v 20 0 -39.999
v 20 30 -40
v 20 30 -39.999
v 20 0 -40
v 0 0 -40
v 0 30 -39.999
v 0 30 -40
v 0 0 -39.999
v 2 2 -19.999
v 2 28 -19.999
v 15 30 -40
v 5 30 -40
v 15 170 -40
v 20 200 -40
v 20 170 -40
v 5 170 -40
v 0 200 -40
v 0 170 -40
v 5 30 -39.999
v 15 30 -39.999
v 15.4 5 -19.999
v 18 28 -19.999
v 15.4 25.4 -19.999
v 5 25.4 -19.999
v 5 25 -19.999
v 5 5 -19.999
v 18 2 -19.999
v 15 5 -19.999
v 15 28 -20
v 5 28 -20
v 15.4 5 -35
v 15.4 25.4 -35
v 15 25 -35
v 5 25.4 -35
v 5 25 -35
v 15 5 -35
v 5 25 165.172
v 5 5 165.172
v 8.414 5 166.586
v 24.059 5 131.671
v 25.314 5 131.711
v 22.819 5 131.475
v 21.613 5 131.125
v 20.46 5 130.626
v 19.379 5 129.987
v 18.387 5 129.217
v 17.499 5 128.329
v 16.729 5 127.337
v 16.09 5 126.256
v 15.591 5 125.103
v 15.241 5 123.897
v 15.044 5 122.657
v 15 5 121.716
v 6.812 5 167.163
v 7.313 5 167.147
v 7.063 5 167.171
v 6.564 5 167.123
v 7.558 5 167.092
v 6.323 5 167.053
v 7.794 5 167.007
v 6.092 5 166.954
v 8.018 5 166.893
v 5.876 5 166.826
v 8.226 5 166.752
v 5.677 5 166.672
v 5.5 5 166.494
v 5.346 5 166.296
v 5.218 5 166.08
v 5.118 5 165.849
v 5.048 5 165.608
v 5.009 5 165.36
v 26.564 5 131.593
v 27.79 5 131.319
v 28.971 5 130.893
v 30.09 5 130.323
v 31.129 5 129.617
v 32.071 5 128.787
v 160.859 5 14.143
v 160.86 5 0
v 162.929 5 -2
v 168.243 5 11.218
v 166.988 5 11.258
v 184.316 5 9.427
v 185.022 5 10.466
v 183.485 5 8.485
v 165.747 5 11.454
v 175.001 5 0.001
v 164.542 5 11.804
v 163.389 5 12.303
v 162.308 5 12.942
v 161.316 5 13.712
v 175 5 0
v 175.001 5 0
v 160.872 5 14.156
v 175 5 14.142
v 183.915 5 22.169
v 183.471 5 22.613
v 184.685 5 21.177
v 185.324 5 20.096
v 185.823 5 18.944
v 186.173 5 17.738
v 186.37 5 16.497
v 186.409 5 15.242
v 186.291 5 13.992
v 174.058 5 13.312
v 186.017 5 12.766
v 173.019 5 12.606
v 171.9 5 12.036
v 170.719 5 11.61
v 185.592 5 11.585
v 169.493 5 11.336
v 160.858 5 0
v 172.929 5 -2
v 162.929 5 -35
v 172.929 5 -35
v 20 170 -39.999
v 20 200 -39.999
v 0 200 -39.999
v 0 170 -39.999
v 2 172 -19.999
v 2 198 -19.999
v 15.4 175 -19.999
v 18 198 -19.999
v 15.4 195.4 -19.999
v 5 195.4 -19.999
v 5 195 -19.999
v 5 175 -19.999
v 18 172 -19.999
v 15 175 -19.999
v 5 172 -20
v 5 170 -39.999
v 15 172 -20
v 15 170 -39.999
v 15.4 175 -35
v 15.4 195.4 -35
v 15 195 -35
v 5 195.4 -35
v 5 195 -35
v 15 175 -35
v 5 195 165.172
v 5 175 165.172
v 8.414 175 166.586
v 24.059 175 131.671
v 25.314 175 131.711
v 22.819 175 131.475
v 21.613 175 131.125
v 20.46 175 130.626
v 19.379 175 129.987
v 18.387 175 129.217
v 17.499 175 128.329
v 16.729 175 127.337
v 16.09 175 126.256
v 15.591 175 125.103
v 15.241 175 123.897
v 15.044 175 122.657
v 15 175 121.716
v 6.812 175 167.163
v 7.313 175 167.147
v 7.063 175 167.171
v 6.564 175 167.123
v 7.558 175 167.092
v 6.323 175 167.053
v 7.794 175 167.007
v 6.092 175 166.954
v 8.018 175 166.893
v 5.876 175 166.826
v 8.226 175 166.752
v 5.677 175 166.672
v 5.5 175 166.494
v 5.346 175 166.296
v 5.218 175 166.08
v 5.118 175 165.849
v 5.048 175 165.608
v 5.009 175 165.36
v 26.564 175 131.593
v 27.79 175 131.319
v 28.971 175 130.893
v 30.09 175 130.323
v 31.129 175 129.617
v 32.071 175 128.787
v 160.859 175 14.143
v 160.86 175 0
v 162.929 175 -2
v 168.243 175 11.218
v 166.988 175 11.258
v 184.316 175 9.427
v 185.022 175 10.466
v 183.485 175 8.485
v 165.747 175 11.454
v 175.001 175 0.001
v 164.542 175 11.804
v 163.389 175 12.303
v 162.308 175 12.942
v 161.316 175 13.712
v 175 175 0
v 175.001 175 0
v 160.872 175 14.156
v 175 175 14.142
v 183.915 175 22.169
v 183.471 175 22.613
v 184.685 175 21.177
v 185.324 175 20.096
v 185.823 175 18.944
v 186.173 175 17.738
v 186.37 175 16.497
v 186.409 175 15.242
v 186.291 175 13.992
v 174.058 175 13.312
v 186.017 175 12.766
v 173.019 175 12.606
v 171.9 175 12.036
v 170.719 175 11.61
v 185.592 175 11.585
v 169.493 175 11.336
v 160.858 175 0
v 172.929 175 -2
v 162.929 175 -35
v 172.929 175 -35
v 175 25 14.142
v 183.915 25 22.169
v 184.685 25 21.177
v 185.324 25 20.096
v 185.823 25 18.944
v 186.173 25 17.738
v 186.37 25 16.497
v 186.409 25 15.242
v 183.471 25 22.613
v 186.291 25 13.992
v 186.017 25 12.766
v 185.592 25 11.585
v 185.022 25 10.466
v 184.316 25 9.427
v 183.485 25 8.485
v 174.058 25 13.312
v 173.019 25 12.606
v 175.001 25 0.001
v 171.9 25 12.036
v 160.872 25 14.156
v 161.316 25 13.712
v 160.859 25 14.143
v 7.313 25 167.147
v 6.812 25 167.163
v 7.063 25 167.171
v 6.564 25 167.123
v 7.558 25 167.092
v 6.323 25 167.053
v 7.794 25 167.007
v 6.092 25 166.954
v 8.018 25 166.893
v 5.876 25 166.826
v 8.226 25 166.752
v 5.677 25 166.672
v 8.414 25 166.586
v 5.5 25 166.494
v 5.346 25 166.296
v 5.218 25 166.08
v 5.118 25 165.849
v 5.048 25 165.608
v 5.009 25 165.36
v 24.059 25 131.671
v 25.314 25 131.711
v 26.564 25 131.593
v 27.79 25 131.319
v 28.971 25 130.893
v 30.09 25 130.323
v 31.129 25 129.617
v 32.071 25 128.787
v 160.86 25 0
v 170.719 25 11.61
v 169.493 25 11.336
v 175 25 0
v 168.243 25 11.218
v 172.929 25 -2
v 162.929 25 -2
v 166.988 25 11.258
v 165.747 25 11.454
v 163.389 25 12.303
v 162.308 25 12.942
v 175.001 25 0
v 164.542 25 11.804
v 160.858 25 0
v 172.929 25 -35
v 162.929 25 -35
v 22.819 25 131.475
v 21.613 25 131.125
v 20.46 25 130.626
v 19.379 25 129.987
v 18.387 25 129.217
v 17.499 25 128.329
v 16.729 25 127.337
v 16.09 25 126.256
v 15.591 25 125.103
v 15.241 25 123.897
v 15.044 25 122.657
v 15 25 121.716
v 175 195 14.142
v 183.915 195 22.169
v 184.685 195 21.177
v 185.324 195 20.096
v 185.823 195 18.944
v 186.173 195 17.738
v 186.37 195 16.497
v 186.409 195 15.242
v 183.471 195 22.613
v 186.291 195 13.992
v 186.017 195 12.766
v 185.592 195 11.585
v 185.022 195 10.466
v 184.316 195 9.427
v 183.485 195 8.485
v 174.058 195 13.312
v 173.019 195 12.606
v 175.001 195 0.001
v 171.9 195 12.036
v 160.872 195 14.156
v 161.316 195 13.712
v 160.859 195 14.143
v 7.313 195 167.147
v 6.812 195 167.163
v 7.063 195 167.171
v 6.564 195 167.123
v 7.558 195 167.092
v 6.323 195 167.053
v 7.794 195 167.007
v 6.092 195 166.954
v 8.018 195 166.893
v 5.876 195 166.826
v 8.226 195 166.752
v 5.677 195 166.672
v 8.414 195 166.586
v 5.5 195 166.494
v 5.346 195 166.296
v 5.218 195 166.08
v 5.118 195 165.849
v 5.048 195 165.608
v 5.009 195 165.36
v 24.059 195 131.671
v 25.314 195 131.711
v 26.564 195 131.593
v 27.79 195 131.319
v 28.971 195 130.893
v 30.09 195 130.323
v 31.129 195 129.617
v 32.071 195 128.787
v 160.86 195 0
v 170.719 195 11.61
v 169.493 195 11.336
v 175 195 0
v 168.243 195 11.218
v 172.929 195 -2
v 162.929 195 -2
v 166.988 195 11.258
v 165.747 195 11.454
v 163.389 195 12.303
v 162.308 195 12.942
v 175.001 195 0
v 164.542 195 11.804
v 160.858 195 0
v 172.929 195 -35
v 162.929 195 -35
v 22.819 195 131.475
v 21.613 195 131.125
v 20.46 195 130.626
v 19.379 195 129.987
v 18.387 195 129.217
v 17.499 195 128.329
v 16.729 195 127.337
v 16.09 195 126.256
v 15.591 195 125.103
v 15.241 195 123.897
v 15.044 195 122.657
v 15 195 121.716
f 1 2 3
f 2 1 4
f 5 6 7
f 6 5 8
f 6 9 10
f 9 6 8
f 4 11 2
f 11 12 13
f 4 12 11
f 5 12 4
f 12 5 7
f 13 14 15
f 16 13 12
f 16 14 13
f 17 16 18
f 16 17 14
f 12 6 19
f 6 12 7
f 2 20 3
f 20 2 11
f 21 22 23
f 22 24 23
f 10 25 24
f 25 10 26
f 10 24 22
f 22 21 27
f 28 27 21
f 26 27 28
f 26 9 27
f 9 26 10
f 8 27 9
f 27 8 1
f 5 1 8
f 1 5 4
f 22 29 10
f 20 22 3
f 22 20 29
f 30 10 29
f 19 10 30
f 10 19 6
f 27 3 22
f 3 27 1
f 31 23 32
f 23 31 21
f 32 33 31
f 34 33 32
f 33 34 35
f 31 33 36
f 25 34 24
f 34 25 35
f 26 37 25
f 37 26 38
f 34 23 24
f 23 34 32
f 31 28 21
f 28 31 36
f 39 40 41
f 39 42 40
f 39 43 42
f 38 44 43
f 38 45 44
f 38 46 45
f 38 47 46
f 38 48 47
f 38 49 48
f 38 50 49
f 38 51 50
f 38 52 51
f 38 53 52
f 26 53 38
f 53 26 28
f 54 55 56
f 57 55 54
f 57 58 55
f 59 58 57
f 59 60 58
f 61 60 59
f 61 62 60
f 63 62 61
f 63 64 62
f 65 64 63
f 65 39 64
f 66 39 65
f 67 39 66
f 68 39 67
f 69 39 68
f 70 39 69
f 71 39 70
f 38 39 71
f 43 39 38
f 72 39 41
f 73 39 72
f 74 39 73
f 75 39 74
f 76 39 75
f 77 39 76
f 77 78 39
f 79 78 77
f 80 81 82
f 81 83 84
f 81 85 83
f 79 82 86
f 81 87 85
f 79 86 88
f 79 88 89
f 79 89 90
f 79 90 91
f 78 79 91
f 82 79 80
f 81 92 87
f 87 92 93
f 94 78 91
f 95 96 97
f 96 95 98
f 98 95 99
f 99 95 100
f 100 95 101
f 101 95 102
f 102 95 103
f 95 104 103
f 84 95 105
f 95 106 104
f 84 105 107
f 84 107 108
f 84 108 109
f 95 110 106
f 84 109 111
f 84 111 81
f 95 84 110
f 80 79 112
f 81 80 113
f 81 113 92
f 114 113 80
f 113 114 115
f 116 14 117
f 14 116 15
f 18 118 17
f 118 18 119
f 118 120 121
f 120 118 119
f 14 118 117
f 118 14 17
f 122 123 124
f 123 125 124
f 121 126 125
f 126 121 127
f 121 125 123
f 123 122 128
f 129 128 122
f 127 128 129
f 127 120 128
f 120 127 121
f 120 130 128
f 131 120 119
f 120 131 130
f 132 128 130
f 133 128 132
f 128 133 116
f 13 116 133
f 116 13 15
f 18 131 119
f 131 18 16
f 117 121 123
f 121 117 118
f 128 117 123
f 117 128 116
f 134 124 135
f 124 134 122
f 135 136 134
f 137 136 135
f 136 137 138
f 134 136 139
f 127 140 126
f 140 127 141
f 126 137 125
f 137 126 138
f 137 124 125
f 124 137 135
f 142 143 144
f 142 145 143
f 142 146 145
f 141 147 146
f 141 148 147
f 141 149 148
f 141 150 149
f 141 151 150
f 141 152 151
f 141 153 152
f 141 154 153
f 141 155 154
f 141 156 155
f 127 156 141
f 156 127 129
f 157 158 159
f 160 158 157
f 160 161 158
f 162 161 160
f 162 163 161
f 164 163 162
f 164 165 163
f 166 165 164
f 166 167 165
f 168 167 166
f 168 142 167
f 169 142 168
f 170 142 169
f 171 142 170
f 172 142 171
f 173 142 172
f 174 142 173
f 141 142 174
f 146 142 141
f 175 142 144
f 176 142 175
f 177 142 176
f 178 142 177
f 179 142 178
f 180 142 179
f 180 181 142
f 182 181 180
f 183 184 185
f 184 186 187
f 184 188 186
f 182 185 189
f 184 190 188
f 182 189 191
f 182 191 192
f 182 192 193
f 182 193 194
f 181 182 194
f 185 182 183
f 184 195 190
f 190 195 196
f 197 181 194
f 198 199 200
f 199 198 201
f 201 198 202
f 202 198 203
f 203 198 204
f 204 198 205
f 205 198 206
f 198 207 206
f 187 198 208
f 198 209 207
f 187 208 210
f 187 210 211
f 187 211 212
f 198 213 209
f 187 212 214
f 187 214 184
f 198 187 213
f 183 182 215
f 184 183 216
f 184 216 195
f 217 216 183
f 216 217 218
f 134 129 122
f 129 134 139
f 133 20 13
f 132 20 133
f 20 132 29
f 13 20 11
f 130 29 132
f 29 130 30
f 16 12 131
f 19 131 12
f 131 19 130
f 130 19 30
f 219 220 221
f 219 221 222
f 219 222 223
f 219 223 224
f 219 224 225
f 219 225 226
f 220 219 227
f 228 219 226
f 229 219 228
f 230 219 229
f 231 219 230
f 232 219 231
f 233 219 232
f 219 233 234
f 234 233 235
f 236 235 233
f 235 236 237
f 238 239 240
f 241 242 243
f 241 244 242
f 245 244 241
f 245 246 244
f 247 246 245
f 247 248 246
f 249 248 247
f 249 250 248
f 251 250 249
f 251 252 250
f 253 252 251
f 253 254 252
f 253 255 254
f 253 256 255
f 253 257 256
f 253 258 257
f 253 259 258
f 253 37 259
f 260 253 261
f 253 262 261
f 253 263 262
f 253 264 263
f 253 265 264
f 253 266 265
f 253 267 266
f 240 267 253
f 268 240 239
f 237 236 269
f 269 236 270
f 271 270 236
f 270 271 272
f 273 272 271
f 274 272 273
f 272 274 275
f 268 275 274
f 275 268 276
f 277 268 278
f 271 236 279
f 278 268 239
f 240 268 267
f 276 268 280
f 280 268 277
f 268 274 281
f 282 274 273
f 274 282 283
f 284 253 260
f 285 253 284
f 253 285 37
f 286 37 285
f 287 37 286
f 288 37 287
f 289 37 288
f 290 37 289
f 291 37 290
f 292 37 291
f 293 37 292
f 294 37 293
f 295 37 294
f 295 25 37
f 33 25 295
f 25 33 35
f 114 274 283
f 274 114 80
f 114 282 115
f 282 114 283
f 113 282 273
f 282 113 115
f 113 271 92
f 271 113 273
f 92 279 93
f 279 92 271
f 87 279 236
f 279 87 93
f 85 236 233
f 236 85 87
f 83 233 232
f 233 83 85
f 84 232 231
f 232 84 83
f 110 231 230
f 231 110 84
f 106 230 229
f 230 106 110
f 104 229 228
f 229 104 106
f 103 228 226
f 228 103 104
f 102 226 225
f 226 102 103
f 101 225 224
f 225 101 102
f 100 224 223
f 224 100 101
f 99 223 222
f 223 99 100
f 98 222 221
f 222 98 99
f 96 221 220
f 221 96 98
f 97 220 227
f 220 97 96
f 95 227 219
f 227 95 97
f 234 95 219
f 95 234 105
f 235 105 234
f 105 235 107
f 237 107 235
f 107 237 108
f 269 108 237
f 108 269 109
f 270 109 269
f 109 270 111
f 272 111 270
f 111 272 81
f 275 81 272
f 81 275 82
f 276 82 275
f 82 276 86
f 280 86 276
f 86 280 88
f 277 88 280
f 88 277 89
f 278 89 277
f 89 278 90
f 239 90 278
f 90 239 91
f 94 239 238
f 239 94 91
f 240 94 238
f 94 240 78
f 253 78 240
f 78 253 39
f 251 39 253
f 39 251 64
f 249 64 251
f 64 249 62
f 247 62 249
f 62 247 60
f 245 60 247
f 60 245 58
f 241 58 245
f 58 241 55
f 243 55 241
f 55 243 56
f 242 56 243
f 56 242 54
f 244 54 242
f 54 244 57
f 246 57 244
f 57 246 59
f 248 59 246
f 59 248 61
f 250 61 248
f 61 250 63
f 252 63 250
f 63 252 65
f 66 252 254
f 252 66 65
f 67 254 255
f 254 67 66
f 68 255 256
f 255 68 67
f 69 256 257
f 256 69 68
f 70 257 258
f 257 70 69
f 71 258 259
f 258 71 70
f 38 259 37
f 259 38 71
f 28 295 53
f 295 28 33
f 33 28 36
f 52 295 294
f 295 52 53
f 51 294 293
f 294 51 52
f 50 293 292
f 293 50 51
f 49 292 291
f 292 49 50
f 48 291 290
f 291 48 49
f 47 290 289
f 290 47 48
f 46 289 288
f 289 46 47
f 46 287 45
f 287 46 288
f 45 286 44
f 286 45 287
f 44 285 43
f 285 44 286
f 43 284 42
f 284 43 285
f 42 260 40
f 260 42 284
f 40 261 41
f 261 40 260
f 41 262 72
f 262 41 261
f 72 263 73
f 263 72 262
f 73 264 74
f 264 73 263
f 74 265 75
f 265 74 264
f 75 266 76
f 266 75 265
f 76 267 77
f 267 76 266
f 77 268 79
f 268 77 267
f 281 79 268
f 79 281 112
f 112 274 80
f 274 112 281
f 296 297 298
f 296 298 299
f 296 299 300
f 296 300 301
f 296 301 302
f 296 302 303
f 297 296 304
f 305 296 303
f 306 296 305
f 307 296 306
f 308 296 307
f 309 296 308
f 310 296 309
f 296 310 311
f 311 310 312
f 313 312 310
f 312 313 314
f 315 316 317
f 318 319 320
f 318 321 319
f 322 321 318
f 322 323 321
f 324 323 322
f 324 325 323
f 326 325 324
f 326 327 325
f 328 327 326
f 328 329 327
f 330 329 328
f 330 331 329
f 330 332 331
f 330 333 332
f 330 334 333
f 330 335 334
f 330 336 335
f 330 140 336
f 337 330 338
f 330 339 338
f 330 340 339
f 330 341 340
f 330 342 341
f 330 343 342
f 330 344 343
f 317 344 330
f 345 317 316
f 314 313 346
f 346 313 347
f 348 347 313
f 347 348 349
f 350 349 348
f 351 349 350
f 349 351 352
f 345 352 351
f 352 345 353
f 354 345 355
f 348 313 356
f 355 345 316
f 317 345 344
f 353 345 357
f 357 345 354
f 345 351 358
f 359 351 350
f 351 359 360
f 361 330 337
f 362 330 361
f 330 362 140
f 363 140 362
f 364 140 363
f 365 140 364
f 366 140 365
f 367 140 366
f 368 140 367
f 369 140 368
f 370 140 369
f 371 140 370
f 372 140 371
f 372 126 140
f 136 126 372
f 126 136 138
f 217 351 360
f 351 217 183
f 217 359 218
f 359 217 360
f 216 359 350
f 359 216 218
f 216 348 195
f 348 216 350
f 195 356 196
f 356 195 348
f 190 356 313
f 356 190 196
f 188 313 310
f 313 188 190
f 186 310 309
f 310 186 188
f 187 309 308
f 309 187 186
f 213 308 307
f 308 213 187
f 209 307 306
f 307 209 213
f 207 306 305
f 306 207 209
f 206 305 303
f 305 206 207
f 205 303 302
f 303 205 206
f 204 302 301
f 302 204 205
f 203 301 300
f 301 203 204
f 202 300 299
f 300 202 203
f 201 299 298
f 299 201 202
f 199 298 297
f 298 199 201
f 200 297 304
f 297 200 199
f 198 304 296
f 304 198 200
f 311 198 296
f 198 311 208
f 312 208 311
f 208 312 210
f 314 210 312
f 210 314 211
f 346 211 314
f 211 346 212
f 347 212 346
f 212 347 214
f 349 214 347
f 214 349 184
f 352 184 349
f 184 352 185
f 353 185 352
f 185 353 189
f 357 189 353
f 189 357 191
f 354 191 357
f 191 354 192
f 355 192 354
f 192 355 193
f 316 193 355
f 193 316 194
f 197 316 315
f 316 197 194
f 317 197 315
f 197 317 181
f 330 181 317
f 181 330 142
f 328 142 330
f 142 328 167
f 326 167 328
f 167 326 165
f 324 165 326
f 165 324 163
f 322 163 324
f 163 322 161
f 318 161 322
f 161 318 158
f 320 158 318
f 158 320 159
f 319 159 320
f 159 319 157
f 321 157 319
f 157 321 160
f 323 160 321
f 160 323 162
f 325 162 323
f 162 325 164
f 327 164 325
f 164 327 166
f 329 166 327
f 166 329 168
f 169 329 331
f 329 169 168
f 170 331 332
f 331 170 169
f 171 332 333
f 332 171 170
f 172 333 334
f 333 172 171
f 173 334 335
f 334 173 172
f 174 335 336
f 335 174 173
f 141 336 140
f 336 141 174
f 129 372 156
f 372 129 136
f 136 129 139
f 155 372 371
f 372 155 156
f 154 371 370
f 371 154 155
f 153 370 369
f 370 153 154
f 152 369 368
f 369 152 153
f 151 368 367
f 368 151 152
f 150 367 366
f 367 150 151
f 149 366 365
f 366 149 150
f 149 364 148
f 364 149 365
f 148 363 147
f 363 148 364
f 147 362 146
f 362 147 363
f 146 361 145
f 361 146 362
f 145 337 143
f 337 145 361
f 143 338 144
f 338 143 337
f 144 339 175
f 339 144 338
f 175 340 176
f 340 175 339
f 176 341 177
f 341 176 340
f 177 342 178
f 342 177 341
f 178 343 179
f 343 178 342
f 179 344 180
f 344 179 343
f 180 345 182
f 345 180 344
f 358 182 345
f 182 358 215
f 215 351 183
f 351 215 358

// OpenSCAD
// A customizable laptop stand 


// Module naming convenitions:
//  - xxx_shape is a 2D shape 
//  - xxx_part is a 3D part
//  - the stand is made of one `lower_rail_part` and two `upper_rail_part`s
//  - the upper rail's front section, that stops the laptop from falling is called the `tip`
//  - the lower rail's section for inserting the upper rail is called `shoe`  


//Input parameters:

ANGLE=45; // the angle
LENGTH = 170; //the total length of the base
WIDTH = 200; //the total width of the base

//side of the triangle calculated from the other side and an angle
HEIGHT1 = sqrt((LENGTH*LENGTH*sin(ANGLE)*sin(ANGLE))/(1-sin(ANGLE)*sin(ANGLE)));

HEIGHT2 = 40;
HEIGHT = HEIGHT1 + HEIGHT2;
echo(HEIGHT);
echo(sqrt(LENGTH*LENGTH+HEIGHT*HEIGHT));


//Parameters to tweak:

//the size of the rails
THICK1 = 10;
THICK2 = 20;

//offsets for the socket
SHOE_OFFS1 = 5;
SHOE_OFFS2 = 3;
SHOE_SPACER = 0.2;

//extra height for the tip section
TIP_OFFS = 2; 


module upper_rail_shape() {
    
    difference(){
        hull(){
            offset(THICK1/5, $fn=50)
            offset(-THICK1/5)
                polygon([[0,0], [0,HEIGHT1], [LENGTH,0]]);
            
            square([0.001,0.001]);
            translate([LENGTH,0])
                square([0.001,0.001]);
        }
        
        //the side of the triangle having height=THICK1
        OFFS = THICK1/sin(90-ANGLE);
        color("blue")
        hull(){    
            offset(THICK1,, $fn=50)
            offset(-2*THICK1)
            polygon([[0,0], [0,HEIGHT1], [LENGTH, 0]]);

            translate([THICK1,-OFFS])
            square([0.001,0.001]);
            translate([LENGTH,-OFFS])
            square([0.001,0.001]);
        }
        //5 mm shorter for the shoe 
        //square([THICK1,5]);
    }
    
    //the toe
    translate([LENGTH,0])
    rotate(-ANGLE)
    translate([-THICK1,0])
    tip_shape();
        
    //front raiser, 5mm shorter because of shoe
    x = THICK1/sin(ANGLE);
    ofs = (x-THICK1)/2;
    translate([LENGTH-THICK1-ofs,0]){
        polygon([[0,0], [THICK1,0], [THICK1, -HEIGHT2 + 5], [0, -HEIGHT2+5]]);    
        polygon([[-ofs,0],[THICK1+ofs,0], [THICK1, -2], [0, -2]]);
    }
    //rear raiser , 5mm shorter because of shoe
    polygon([[0,0],[THICK1,0], [THICK1,-HEIGHT2+5], [0,-HEIGHT2+5]]);
}


module tip_shape(){
    union(){
        //the lower rounding
        translate([-THICK1,0])
        difference(){
            square([THICK1, THICK1]);
            translate([0, THICK1]) circle(r=THICK1, $fn=50);
        }

        // the upper rounding
        translate([0,THICK1+TIP_OFFS])
        intersection(){
            square([THICK1, THICK1]);
            circle(r=THICK1, $fn=50);
        }
        
        square([THICK1,THICK1+TIP_OFFS]);
    }
}


module upper_rail_part(){
    linear_extrude(height=THICK2)
        upper_rail_shape();
}


module shoe_part(){
    translate([SHOE_OFFS1,SHOE_OFFS1])
    difference(){
        hull(){
           translate([-SHOE_OFFS1,-SHOE_OFFS1,0])
           scale([(THICK1+2*SHOE_OFFS1)/THICK1, (THICK2+2*SHOE_OFFS1)/THICK2,1])
           cube([THICK1,THICK2,0.001]);

           translate([-SHOE_OFFS2,-SHOE_OFFS2, THICK2])
           scale([(THICK1+2*SHOE_OFFS2)/THICK1, (THICK2+2*SHOE_OFFS2)/THICK2,1])
           cube([THICK1,THICK2,0.001]);
       }
       
       //the cutout + 0.2 spacer
       translate([0,0,5])
       scale([(THICK1+2*SHOE_SPACER)/THICK1, (THICK2+2*SHOE_SPACER)/THICK2,1])
       cube([THICK1,THICK2,THICK2]);
    }
}

module lower_rail_part(){
    
    SHOE_WIDTH = THICK2+2*SHOE_OFFS1;
    
    shoe_part();    
    translate([0, WIDTH-SHOE_WIDTH])
        shoe_part();
    
    //the cross rail
    translate([SHOE_OFFS1, SHOE_WIDTH-SHOE_OFFS2, 0])
    cube([THICK1, WIDTH - 2* (SHOE_WIDTH - SHOE_OFFS2), THICK2]);
}

module demo() {
    
    lower_rail_part();
    
    translate([SHOE_OFFS1,THICK2+SHOE_OFFS1,0])
    rotate([90,0,0])
    upper_rail_part();
    
    translate([SHOE_OFFS1,WIDTH-SHOE_OFFS1,0])
    rotate([90,0,0])
    upper_rail_part();
}

module upper_rail_part(){
    linear_extrude(height=THICK2)
        union() upper_rail_shape();
}


module shoe_part(){
    translate([SHOE_OFFS1,SHOE_OFFS1])
    difference(){
        hull(){
           translate([-SHOE_OFFS1,-SHOE_OFFS1,0])
           scale([(THICK1+2*SHOE_OFFS1)/THICK1, (THICK2+2*SHOE_OFFS1)/THICK2,1])
           cube([THICK1,THICK2,0.001]);

           translate([-SHOE_OFFS2,-SHOE_OFFS2, THICK2])
           scale([(THICK1+2*SHOE_OFFS2)/THICK1, (THICK2+2*SHOE_OFFS2)/THICK2,1])
           cube([THICK1,THICK2,0.001]);
       }
       
       //the cutout + 0.2 spacer
       translate([0,0,5])
       scale([(THICK1+2*SHOE_SPACER)/THICK1, (THICK2+2*SHOE_SPACER)/THICK2,1])
       cube([THICK1,THICK2,THICK2]);
    }
}

module lower_rail_part(){
    
    SHOE_WIDTH = THICK2+2*SHOE_OFFS1;
    
    shoe_part();    
    translate([0, WIDTH-SHOE_WIDTH])
        shoe_part();
    
    //the cross rail
    translate([SHOE_OFFS1, SHOE_WIDTH-SHOE_OFFS2, 0])
    cube([THICK1, WIDTH - 2* (SHOE_WIDTH - SHOE_OFFS2), THICK2]);
}

module demo() {
    
    translate([0,0,-HEIGHT2])
    lower_rail_part();
    
    translate([SHOE_OFFS1,THICK2+SHOE_OFFS1,0])
    rotate([90,0,0])
    upper_rail_part();
    
    translate([SHOE_OFFS1,WIDTH-SHOE_OFFS1,0])
    rotate([90,0,0])
    upper_rail_part();
}

demo();
//upper_rail_shape();
